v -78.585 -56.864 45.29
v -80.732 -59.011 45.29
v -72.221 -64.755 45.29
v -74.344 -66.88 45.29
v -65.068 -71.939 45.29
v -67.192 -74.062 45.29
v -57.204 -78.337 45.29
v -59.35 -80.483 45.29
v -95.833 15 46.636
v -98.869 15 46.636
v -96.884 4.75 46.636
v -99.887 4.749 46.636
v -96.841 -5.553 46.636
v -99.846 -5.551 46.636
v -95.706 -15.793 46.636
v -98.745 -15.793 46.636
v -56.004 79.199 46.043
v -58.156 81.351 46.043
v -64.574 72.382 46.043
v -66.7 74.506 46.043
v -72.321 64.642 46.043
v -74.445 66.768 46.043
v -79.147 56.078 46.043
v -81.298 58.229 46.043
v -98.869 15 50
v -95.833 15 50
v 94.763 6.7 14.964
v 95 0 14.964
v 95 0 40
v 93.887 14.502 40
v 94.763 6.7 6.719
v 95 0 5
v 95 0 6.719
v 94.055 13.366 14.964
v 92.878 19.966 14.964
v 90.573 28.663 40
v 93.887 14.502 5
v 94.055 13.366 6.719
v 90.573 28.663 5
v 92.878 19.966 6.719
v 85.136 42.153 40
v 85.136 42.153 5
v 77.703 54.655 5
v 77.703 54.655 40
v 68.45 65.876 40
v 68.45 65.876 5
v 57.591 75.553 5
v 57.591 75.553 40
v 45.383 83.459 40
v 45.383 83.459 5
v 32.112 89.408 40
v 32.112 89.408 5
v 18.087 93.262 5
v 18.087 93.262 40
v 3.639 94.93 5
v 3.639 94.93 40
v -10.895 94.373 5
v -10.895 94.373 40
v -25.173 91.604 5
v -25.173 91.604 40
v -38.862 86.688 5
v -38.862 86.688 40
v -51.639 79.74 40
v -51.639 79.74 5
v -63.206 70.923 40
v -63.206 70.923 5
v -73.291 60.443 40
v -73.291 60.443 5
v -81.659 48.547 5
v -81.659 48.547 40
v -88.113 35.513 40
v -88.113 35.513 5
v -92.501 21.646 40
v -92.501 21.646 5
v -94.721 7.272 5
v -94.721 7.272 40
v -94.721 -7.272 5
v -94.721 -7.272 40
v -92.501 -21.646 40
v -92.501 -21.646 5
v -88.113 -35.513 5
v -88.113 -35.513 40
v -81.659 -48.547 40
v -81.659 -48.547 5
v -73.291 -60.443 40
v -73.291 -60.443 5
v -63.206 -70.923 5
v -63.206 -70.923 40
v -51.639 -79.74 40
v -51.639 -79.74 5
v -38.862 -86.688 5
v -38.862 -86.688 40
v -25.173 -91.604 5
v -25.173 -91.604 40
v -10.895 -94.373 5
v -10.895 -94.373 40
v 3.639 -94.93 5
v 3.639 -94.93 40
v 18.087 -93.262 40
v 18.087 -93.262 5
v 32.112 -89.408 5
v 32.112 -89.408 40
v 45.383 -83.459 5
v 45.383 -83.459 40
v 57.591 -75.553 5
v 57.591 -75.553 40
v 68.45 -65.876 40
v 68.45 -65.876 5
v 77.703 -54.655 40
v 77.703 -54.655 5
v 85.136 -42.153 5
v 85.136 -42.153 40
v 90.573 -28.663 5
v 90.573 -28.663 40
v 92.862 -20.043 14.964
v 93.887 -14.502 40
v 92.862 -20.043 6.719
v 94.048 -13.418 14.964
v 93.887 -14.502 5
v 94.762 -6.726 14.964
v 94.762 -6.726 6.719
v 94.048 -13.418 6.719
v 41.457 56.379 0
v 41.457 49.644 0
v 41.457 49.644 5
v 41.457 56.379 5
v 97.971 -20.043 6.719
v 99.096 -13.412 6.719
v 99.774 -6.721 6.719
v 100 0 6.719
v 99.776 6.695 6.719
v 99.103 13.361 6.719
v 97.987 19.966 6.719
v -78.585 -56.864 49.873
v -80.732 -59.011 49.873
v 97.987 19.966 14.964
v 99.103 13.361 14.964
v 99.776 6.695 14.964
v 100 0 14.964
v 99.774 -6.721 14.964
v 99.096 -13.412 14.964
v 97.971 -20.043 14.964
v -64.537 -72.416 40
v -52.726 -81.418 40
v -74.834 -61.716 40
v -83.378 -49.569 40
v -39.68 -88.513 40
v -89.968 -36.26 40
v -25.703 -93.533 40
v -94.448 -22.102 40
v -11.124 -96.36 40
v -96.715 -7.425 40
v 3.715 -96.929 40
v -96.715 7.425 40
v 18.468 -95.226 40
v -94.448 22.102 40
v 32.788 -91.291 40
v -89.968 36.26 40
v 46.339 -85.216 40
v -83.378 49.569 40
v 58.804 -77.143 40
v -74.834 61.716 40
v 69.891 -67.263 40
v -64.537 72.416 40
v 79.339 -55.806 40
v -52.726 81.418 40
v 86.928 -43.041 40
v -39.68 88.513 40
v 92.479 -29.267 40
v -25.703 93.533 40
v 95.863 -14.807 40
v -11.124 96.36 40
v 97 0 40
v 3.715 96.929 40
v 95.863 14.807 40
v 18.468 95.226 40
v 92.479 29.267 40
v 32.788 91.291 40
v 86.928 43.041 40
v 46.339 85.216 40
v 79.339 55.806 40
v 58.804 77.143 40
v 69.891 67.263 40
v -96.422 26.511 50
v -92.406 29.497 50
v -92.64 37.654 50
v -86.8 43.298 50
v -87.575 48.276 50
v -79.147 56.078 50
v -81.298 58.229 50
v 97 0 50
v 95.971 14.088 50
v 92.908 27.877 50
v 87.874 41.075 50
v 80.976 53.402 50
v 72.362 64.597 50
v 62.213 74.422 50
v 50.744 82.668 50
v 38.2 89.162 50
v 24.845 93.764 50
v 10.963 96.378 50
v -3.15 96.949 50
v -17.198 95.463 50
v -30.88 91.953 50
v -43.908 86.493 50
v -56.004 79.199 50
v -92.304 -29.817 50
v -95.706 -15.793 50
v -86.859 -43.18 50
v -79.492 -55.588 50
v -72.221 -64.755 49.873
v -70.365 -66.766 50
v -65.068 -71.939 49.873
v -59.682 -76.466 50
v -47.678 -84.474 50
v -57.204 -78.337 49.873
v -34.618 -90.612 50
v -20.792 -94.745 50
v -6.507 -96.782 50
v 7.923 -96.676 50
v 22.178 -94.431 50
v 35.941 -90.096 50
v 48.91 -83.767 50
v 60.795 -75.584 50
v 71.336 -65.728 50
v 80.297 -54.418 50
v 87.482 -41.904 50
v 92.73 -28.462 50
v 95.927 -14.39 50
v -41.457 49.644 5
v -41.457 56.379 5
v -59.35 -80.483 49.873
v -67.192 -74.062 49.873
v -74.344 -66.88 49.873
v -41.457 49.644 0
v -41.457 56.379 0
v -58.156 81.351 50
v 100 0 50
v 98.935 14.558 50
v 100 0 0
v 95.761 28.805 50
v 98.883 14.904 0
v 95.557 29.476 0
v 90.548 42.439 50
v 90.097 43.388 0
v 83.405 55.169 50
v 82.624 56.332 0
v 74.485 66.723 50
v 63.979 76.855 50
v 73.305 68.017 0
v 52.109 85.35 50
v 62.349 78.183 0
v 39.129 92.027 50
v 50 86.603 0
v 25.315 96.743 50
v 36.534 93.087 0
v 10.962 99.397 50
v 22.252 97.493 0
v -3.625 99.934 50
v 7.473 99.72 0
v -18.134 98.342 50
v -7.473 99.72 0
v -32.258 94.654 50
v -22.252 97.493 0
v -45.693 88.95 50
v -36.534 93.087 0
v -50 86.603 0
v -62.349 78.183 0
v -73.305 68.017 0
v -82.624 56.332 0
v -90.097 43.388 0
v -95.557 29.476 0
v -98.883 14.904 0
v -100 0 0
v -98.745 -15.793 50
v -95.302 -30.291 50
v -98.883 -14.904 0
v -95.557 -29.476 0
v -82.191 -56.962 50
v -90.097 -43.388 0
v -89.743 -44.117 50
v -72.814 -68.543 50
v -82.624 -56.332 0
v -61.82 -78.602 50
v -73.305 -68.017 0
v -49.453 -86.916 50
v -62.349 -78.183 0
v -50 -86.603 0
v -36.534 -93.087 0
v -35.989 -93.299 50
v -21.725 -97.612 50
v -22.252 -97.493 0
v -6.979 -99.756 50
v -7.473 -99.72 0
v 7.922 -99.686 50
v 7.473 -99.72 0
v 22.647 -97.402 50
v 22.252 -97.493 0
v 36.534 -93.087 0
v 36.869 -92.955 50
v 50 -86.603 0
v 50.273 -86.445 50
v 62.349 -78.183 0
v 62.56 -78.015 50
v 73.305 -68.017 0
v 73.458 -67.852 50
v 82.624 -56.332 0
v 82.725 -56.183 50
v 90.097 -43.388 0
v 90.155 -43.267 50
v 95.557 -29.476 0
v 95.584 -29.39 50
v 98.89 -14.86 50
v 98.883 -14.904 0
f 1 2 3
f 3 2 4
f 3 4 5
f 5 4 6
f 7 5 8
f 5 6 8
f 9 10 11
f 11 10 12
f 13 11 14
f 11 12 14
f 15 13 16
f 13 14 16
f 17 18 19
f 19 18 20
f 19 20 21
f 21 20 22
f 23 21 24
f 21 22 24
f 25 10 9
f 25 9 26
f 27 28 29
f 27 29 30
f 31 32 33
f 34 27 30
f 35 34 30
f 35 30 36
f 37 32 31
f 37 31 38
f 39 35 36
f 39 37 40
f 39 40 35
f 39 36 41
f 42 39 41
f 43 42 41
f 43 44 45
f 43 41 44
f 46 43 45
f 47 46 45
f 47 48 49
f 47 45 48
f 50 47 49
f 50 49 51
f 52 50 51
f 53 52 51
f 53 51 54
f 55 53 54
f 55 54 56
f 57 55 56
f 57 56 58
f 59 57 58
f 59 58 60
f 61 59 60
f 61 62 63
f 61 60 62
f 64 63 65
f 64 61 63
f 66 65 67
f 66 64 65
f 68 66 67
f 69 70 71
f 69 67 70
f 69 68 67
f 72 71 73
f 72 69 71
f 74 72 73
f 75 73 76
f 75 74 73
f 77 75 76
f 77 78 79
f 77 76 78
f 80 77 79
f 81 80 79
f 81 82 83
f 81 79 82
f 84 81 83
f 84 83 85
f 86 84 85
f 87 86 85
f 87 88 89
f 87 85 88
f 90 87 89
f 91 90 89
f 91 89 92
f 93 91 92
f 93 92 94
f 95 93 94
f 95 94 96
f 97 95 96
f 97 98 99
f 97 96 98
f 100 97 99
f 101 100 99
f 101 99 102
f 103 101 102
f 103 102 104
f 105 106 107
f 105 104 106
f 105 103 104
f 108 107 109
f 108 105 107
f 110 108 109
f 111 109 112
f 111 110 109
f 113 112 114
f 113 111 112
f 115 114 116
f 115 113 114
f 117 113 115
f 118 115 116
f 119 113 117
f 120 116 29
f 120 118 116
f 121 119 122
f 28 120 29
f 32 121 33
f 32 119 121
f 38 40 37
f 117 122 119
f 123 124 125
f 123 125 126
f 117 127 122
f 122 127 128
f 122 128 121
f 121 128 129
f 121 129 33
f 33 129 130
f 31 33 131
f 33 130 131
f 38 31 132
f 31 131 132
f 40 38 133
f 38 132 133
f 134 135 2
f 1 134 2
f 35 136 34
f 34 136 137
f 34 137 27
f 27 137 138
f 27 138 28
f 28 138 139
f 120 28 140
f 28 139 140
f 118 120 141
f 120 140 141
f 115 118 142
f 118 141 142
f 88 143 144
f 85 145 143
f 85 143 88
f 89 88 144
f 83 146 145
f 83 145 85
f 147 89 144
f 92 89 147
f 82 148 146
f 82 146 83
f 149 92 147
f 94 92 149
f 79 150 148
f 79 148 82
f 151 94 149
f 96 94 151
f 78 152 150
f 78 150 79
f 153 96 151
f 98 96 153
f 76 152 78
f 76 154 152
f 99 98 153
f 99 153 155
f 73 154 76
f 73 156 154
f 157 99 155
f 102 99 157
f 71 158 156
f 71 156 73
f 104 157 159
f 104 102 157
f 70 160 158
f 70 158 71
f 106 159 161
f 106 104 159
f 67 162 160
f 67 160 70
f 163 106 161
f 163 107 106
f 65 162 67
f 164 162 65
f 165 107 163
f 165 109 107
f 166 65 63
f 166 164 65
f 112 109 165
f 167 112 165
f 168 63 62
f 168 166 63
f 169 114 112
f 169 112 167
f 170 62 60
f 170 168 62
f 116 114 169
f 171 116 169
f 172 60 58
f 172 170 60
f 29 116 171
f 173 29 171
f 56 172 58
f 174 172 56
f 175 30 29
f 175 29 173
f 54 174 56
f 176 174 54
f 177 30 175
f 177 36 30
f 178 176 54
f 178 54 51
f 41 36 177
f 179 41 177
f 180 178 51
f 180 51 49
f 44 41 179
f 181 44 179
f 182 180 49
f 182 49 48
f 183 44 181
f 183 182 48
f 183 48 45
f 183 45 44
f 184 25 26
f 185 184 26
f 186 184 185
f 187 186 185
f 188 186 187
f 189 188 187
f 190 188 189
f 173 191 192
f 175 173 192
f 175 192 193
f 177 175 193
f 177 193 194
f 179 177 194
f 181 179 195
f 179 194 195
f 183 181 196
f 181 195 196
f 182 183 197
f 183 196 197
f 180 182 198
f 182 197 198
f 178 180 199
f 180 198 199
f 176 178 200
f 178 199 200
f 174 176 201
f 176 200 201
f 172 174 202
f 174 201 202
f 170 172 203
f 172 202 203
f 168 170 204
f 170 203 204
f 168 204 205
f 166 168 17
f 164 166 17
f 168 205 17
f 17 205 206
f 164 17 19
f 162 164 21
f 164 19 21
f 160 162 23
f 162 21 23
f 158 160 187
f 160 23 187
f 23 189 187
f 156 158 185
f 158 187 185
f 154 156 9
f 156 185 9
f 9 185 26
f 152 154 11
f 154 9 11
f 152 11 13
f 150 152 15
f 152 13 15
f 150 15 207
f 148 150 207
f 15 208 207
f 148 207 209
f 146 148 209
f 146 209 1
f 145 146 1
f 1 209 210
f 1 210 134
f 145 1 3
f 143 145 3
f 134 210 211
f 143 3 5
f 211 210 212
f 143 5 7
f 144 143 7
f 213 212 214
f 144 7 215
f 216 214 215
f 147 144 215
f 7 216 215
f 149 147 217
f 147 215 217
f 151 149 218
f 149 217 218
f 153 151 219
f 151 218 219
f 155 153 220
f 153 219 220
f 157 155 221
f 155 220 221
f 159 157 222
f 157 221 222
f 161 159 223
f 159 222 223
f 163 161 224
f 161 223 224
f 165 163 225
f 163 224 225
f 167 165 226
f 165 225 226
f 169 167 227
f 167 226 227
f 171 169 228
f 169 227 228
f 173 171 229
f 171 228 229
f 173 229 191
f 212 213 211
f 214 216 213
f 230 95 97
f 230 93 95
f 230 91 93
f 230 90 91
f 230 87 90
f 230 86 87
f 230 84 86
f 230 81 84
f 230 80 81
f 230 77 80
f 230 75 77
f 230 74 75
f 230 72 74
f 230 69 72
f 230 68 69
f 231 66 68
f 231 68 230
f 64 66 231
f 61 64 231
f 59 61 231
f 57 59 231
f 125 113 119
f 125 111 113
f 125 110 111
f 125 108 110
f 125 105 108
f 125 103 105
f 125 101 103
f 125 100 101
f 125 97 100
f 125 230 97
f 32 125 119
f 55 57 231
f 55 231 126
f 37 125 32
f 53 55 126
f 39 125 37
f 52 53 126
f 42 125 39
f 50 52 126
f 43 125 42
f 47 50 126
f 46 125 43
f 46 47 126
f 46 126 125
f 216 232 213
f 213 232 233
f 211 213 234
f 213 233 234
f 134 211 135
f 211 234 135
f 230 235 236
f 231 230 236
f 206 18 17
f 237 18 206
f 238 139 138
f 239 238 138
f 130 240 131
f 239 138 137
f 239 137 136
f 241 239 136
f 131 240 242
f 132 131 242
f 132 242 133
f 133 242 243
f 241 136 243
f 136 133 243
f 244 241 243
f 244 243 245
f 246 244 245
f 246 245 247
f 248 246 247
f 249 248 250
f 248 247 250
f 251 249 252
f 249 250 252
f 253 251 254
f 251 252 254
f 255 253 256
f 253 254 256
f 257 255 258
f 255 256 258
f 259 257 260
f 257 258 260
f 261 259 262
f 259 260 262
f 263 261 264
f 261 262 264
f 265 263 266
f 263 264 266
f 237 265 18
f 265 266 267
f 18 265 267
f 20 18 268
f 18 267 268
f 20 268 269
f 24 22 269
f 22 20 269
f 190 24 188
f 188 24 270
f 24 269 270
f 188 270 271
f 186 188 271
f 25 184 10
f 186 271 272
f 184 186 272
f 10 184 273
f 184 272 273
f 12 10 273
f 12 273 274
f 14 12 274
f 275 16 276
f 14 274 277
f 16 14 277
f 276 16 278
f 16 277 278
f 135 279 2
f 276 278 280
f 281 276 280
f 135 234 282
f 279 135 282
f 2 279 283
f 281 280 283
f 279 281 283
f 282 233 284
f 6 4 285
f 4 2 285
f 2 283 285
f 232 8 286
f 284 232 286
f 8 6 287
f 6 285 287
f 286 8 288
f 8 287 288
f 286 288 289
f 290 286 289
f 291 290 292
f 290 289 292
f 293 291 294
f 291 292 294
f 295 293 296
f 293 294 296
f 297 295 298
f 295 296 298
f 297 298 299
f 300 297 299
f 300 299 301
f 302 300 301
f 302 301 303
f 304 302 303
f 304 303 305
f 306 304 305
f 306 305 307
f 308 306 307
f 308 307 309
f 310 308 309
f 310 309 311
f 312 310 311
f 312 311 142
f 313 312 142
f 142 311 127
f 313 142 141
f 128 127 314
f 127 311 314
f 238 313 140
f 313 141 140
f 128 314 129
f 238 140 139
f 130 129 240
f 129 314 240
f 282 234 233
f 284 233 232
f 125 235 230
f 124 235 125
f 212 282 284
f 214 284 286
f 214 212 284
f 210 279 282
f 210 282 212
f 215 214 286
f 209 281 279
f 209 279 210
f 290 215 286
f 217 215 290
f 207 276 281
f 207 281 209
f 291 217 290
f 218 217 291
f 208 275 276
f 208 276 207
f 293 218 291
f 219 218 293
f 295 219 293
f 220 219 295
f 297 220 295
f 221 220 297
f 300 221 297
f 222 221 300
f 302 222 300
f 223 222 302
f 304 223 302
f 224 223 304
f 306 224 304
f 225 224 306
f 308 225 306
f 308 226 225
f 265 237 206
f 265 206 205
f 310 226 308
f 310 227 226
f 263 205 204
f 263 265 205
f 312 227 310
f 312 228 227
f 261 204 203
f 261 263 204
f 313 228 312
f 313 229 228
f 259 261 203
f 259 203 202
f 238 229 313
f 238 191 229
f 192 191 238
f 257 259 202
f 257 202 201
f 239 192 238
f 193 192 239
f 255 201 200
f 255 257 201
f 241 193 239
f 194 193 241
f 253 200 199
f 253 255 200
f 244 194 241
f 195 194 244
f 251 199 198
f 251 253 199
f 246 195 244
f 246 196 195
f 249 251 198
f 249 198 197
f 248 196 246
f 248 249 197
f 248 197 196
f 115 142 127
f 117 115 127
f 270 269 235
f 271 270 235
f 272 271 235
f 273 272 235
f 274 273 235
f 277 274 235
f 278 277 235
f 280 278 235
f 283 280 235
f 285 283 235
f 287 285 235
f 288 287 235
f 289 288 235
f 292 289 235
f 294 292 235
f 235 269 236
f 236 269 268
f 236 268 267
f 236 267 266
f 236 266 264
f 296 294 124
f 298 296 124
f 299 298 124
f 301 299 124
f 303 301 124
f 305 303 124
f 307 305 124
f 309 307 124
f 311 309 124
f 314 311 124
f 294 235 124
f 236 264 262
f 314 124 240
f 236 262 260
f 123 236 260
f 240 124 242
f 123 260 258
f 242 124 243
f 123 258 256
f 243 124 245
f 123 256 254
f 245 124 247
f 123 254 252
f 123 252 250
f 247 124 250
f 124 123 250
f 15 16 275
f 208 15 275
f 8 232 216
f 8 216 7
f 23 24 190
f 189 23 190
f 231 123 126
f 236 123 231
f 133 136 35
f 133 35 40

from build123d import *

# Parameters (mm, degrees)
SKETCH_1_R          = 100
EXTRUDE_2_DEPTH     = 50
SHELL_2_T           = -5
SKETCH_6_W          = 82.913902184
SKETCH_6_H          = 6.735302979
CUT_EXTRUDE_1_DEPTH = 10
SKETCH_9_R          = 97
CUT_EXTRUDE_2_DEPTH = 10
SKETCH_13_W         = 6
SKETCH_13_H         = 30.793483952
CUT_EXTRUDE_3_DEPTH = 10
SKETCH_16_W         = 8.245924623
SKETCH_16_H         = 40.008749502
CUT_EXTRUDE_6_DEPTH = 10
SKETCH_17_W         = 4.583098869
SKETCH_17_H         = 30.302333069
CUT_EXTRUDE_7_DEPTH = 10
SKETCH_18_W         = 6.507967363
SKETCH_18_H         = 32.713121907
CUT_EXTRUDE_8_DEPTH = 10


with BuildPart() as part:
    # 草图1 → 凸台-拉伸2 (new body)
    with BuildSketch(Plane.XY):
        Circle(SKETCH_1_R)
    extrude(amount=EXTRUDE_2_DEPTH)

    # 抽壳2
    shell_2_openings = [part.faces().sort_by_distance(p)[0] for p in [
        (0, 0, 50),
    ]]
    offset(amount=SHELL_2_T, openings=shell_2_openings, kind=Kind.INTERSECTION)

    # 草图6 → 切除-拉伸1 (cut)
    with BuildSketch(Plane.XY):
        with Locations((0, 53.011479478)):
            Rectangle(SKETCH_6_W, SKETCH_6_H)
    extrude(amount=CUT_EXTRUDE_1_DEPTH, mode=Mode.SUBTRACT)

    # 草图9 → 切除-拉伸2 (cut)
    with BuildSketch(Plane.XY.offset(50)):
        Circle(SKETCH_9_R)
    extrude(amount=-CUT_EXTRUDE_2_DEPTH, mode=Mode.SUBTRACT)

    # 草图13 → 切除-拉伸3 (cut)
    with BuildSketch(Plane.ZY.offset(100)):
        with Locations((49.635646507, -0.396741976)):
            Rectangle(SKETCH_13_W, SKETCH_13_H)
    extrude(amount=-CUT_EXTRUDE_3_DEPTH, mode=Mode.SUBTRACT)

    # 草图16 → 切除-拉伸6 (cut)
    with BuildSketch(Plane(origin=(100, 0, 0), x_dir=(0, 0, -1), z_dir=(1, 0, 0))):
        with Locations((-10.841517517, -0.038286219)):
            Rectangle(SKETCH_16_W, SKETCH_16_H)
    extrude(amount=-CUT_EXTRUDE_6_DEPTH, mode=Mode.SUBTRACT)

    # 草图17 → 切除-拉伸7 (cut)
    with BuildSketch(Plane(origin=(-70.710678119, -70.710678119, 0), x_dir=(0, 0, -1), z_dir=(-0.7071067811865464, -0.7071067811865488, 0))):
        with Locations((-47.581138772, -0.207959565)):
            Rectangle(SKETCH_17_W, SKETCH_17_H)
    extrude(amount=-CUT_EXTRUDE_7_DEPTH, mode=Mode.SUBTRACT)

    # 草图18 → 切除-拉伸8 (cut)
    with BuildSketch(Plane(origin=(-70.710678119, 70.710678119, 0), x_dir=(0, 0, 1), z_dir=(-0.7071067811865487, 0.7071067811865465, 0))):
        with Locations((49.297240538, 0.044727536)):
            Rectangle(SKETCH_18_W, SKETCH_18_H)
    extrude(amount=-CUT_EXTRUDE_8_DEPTH, mode=Mode.SUBTRACT)


solid = part.part
